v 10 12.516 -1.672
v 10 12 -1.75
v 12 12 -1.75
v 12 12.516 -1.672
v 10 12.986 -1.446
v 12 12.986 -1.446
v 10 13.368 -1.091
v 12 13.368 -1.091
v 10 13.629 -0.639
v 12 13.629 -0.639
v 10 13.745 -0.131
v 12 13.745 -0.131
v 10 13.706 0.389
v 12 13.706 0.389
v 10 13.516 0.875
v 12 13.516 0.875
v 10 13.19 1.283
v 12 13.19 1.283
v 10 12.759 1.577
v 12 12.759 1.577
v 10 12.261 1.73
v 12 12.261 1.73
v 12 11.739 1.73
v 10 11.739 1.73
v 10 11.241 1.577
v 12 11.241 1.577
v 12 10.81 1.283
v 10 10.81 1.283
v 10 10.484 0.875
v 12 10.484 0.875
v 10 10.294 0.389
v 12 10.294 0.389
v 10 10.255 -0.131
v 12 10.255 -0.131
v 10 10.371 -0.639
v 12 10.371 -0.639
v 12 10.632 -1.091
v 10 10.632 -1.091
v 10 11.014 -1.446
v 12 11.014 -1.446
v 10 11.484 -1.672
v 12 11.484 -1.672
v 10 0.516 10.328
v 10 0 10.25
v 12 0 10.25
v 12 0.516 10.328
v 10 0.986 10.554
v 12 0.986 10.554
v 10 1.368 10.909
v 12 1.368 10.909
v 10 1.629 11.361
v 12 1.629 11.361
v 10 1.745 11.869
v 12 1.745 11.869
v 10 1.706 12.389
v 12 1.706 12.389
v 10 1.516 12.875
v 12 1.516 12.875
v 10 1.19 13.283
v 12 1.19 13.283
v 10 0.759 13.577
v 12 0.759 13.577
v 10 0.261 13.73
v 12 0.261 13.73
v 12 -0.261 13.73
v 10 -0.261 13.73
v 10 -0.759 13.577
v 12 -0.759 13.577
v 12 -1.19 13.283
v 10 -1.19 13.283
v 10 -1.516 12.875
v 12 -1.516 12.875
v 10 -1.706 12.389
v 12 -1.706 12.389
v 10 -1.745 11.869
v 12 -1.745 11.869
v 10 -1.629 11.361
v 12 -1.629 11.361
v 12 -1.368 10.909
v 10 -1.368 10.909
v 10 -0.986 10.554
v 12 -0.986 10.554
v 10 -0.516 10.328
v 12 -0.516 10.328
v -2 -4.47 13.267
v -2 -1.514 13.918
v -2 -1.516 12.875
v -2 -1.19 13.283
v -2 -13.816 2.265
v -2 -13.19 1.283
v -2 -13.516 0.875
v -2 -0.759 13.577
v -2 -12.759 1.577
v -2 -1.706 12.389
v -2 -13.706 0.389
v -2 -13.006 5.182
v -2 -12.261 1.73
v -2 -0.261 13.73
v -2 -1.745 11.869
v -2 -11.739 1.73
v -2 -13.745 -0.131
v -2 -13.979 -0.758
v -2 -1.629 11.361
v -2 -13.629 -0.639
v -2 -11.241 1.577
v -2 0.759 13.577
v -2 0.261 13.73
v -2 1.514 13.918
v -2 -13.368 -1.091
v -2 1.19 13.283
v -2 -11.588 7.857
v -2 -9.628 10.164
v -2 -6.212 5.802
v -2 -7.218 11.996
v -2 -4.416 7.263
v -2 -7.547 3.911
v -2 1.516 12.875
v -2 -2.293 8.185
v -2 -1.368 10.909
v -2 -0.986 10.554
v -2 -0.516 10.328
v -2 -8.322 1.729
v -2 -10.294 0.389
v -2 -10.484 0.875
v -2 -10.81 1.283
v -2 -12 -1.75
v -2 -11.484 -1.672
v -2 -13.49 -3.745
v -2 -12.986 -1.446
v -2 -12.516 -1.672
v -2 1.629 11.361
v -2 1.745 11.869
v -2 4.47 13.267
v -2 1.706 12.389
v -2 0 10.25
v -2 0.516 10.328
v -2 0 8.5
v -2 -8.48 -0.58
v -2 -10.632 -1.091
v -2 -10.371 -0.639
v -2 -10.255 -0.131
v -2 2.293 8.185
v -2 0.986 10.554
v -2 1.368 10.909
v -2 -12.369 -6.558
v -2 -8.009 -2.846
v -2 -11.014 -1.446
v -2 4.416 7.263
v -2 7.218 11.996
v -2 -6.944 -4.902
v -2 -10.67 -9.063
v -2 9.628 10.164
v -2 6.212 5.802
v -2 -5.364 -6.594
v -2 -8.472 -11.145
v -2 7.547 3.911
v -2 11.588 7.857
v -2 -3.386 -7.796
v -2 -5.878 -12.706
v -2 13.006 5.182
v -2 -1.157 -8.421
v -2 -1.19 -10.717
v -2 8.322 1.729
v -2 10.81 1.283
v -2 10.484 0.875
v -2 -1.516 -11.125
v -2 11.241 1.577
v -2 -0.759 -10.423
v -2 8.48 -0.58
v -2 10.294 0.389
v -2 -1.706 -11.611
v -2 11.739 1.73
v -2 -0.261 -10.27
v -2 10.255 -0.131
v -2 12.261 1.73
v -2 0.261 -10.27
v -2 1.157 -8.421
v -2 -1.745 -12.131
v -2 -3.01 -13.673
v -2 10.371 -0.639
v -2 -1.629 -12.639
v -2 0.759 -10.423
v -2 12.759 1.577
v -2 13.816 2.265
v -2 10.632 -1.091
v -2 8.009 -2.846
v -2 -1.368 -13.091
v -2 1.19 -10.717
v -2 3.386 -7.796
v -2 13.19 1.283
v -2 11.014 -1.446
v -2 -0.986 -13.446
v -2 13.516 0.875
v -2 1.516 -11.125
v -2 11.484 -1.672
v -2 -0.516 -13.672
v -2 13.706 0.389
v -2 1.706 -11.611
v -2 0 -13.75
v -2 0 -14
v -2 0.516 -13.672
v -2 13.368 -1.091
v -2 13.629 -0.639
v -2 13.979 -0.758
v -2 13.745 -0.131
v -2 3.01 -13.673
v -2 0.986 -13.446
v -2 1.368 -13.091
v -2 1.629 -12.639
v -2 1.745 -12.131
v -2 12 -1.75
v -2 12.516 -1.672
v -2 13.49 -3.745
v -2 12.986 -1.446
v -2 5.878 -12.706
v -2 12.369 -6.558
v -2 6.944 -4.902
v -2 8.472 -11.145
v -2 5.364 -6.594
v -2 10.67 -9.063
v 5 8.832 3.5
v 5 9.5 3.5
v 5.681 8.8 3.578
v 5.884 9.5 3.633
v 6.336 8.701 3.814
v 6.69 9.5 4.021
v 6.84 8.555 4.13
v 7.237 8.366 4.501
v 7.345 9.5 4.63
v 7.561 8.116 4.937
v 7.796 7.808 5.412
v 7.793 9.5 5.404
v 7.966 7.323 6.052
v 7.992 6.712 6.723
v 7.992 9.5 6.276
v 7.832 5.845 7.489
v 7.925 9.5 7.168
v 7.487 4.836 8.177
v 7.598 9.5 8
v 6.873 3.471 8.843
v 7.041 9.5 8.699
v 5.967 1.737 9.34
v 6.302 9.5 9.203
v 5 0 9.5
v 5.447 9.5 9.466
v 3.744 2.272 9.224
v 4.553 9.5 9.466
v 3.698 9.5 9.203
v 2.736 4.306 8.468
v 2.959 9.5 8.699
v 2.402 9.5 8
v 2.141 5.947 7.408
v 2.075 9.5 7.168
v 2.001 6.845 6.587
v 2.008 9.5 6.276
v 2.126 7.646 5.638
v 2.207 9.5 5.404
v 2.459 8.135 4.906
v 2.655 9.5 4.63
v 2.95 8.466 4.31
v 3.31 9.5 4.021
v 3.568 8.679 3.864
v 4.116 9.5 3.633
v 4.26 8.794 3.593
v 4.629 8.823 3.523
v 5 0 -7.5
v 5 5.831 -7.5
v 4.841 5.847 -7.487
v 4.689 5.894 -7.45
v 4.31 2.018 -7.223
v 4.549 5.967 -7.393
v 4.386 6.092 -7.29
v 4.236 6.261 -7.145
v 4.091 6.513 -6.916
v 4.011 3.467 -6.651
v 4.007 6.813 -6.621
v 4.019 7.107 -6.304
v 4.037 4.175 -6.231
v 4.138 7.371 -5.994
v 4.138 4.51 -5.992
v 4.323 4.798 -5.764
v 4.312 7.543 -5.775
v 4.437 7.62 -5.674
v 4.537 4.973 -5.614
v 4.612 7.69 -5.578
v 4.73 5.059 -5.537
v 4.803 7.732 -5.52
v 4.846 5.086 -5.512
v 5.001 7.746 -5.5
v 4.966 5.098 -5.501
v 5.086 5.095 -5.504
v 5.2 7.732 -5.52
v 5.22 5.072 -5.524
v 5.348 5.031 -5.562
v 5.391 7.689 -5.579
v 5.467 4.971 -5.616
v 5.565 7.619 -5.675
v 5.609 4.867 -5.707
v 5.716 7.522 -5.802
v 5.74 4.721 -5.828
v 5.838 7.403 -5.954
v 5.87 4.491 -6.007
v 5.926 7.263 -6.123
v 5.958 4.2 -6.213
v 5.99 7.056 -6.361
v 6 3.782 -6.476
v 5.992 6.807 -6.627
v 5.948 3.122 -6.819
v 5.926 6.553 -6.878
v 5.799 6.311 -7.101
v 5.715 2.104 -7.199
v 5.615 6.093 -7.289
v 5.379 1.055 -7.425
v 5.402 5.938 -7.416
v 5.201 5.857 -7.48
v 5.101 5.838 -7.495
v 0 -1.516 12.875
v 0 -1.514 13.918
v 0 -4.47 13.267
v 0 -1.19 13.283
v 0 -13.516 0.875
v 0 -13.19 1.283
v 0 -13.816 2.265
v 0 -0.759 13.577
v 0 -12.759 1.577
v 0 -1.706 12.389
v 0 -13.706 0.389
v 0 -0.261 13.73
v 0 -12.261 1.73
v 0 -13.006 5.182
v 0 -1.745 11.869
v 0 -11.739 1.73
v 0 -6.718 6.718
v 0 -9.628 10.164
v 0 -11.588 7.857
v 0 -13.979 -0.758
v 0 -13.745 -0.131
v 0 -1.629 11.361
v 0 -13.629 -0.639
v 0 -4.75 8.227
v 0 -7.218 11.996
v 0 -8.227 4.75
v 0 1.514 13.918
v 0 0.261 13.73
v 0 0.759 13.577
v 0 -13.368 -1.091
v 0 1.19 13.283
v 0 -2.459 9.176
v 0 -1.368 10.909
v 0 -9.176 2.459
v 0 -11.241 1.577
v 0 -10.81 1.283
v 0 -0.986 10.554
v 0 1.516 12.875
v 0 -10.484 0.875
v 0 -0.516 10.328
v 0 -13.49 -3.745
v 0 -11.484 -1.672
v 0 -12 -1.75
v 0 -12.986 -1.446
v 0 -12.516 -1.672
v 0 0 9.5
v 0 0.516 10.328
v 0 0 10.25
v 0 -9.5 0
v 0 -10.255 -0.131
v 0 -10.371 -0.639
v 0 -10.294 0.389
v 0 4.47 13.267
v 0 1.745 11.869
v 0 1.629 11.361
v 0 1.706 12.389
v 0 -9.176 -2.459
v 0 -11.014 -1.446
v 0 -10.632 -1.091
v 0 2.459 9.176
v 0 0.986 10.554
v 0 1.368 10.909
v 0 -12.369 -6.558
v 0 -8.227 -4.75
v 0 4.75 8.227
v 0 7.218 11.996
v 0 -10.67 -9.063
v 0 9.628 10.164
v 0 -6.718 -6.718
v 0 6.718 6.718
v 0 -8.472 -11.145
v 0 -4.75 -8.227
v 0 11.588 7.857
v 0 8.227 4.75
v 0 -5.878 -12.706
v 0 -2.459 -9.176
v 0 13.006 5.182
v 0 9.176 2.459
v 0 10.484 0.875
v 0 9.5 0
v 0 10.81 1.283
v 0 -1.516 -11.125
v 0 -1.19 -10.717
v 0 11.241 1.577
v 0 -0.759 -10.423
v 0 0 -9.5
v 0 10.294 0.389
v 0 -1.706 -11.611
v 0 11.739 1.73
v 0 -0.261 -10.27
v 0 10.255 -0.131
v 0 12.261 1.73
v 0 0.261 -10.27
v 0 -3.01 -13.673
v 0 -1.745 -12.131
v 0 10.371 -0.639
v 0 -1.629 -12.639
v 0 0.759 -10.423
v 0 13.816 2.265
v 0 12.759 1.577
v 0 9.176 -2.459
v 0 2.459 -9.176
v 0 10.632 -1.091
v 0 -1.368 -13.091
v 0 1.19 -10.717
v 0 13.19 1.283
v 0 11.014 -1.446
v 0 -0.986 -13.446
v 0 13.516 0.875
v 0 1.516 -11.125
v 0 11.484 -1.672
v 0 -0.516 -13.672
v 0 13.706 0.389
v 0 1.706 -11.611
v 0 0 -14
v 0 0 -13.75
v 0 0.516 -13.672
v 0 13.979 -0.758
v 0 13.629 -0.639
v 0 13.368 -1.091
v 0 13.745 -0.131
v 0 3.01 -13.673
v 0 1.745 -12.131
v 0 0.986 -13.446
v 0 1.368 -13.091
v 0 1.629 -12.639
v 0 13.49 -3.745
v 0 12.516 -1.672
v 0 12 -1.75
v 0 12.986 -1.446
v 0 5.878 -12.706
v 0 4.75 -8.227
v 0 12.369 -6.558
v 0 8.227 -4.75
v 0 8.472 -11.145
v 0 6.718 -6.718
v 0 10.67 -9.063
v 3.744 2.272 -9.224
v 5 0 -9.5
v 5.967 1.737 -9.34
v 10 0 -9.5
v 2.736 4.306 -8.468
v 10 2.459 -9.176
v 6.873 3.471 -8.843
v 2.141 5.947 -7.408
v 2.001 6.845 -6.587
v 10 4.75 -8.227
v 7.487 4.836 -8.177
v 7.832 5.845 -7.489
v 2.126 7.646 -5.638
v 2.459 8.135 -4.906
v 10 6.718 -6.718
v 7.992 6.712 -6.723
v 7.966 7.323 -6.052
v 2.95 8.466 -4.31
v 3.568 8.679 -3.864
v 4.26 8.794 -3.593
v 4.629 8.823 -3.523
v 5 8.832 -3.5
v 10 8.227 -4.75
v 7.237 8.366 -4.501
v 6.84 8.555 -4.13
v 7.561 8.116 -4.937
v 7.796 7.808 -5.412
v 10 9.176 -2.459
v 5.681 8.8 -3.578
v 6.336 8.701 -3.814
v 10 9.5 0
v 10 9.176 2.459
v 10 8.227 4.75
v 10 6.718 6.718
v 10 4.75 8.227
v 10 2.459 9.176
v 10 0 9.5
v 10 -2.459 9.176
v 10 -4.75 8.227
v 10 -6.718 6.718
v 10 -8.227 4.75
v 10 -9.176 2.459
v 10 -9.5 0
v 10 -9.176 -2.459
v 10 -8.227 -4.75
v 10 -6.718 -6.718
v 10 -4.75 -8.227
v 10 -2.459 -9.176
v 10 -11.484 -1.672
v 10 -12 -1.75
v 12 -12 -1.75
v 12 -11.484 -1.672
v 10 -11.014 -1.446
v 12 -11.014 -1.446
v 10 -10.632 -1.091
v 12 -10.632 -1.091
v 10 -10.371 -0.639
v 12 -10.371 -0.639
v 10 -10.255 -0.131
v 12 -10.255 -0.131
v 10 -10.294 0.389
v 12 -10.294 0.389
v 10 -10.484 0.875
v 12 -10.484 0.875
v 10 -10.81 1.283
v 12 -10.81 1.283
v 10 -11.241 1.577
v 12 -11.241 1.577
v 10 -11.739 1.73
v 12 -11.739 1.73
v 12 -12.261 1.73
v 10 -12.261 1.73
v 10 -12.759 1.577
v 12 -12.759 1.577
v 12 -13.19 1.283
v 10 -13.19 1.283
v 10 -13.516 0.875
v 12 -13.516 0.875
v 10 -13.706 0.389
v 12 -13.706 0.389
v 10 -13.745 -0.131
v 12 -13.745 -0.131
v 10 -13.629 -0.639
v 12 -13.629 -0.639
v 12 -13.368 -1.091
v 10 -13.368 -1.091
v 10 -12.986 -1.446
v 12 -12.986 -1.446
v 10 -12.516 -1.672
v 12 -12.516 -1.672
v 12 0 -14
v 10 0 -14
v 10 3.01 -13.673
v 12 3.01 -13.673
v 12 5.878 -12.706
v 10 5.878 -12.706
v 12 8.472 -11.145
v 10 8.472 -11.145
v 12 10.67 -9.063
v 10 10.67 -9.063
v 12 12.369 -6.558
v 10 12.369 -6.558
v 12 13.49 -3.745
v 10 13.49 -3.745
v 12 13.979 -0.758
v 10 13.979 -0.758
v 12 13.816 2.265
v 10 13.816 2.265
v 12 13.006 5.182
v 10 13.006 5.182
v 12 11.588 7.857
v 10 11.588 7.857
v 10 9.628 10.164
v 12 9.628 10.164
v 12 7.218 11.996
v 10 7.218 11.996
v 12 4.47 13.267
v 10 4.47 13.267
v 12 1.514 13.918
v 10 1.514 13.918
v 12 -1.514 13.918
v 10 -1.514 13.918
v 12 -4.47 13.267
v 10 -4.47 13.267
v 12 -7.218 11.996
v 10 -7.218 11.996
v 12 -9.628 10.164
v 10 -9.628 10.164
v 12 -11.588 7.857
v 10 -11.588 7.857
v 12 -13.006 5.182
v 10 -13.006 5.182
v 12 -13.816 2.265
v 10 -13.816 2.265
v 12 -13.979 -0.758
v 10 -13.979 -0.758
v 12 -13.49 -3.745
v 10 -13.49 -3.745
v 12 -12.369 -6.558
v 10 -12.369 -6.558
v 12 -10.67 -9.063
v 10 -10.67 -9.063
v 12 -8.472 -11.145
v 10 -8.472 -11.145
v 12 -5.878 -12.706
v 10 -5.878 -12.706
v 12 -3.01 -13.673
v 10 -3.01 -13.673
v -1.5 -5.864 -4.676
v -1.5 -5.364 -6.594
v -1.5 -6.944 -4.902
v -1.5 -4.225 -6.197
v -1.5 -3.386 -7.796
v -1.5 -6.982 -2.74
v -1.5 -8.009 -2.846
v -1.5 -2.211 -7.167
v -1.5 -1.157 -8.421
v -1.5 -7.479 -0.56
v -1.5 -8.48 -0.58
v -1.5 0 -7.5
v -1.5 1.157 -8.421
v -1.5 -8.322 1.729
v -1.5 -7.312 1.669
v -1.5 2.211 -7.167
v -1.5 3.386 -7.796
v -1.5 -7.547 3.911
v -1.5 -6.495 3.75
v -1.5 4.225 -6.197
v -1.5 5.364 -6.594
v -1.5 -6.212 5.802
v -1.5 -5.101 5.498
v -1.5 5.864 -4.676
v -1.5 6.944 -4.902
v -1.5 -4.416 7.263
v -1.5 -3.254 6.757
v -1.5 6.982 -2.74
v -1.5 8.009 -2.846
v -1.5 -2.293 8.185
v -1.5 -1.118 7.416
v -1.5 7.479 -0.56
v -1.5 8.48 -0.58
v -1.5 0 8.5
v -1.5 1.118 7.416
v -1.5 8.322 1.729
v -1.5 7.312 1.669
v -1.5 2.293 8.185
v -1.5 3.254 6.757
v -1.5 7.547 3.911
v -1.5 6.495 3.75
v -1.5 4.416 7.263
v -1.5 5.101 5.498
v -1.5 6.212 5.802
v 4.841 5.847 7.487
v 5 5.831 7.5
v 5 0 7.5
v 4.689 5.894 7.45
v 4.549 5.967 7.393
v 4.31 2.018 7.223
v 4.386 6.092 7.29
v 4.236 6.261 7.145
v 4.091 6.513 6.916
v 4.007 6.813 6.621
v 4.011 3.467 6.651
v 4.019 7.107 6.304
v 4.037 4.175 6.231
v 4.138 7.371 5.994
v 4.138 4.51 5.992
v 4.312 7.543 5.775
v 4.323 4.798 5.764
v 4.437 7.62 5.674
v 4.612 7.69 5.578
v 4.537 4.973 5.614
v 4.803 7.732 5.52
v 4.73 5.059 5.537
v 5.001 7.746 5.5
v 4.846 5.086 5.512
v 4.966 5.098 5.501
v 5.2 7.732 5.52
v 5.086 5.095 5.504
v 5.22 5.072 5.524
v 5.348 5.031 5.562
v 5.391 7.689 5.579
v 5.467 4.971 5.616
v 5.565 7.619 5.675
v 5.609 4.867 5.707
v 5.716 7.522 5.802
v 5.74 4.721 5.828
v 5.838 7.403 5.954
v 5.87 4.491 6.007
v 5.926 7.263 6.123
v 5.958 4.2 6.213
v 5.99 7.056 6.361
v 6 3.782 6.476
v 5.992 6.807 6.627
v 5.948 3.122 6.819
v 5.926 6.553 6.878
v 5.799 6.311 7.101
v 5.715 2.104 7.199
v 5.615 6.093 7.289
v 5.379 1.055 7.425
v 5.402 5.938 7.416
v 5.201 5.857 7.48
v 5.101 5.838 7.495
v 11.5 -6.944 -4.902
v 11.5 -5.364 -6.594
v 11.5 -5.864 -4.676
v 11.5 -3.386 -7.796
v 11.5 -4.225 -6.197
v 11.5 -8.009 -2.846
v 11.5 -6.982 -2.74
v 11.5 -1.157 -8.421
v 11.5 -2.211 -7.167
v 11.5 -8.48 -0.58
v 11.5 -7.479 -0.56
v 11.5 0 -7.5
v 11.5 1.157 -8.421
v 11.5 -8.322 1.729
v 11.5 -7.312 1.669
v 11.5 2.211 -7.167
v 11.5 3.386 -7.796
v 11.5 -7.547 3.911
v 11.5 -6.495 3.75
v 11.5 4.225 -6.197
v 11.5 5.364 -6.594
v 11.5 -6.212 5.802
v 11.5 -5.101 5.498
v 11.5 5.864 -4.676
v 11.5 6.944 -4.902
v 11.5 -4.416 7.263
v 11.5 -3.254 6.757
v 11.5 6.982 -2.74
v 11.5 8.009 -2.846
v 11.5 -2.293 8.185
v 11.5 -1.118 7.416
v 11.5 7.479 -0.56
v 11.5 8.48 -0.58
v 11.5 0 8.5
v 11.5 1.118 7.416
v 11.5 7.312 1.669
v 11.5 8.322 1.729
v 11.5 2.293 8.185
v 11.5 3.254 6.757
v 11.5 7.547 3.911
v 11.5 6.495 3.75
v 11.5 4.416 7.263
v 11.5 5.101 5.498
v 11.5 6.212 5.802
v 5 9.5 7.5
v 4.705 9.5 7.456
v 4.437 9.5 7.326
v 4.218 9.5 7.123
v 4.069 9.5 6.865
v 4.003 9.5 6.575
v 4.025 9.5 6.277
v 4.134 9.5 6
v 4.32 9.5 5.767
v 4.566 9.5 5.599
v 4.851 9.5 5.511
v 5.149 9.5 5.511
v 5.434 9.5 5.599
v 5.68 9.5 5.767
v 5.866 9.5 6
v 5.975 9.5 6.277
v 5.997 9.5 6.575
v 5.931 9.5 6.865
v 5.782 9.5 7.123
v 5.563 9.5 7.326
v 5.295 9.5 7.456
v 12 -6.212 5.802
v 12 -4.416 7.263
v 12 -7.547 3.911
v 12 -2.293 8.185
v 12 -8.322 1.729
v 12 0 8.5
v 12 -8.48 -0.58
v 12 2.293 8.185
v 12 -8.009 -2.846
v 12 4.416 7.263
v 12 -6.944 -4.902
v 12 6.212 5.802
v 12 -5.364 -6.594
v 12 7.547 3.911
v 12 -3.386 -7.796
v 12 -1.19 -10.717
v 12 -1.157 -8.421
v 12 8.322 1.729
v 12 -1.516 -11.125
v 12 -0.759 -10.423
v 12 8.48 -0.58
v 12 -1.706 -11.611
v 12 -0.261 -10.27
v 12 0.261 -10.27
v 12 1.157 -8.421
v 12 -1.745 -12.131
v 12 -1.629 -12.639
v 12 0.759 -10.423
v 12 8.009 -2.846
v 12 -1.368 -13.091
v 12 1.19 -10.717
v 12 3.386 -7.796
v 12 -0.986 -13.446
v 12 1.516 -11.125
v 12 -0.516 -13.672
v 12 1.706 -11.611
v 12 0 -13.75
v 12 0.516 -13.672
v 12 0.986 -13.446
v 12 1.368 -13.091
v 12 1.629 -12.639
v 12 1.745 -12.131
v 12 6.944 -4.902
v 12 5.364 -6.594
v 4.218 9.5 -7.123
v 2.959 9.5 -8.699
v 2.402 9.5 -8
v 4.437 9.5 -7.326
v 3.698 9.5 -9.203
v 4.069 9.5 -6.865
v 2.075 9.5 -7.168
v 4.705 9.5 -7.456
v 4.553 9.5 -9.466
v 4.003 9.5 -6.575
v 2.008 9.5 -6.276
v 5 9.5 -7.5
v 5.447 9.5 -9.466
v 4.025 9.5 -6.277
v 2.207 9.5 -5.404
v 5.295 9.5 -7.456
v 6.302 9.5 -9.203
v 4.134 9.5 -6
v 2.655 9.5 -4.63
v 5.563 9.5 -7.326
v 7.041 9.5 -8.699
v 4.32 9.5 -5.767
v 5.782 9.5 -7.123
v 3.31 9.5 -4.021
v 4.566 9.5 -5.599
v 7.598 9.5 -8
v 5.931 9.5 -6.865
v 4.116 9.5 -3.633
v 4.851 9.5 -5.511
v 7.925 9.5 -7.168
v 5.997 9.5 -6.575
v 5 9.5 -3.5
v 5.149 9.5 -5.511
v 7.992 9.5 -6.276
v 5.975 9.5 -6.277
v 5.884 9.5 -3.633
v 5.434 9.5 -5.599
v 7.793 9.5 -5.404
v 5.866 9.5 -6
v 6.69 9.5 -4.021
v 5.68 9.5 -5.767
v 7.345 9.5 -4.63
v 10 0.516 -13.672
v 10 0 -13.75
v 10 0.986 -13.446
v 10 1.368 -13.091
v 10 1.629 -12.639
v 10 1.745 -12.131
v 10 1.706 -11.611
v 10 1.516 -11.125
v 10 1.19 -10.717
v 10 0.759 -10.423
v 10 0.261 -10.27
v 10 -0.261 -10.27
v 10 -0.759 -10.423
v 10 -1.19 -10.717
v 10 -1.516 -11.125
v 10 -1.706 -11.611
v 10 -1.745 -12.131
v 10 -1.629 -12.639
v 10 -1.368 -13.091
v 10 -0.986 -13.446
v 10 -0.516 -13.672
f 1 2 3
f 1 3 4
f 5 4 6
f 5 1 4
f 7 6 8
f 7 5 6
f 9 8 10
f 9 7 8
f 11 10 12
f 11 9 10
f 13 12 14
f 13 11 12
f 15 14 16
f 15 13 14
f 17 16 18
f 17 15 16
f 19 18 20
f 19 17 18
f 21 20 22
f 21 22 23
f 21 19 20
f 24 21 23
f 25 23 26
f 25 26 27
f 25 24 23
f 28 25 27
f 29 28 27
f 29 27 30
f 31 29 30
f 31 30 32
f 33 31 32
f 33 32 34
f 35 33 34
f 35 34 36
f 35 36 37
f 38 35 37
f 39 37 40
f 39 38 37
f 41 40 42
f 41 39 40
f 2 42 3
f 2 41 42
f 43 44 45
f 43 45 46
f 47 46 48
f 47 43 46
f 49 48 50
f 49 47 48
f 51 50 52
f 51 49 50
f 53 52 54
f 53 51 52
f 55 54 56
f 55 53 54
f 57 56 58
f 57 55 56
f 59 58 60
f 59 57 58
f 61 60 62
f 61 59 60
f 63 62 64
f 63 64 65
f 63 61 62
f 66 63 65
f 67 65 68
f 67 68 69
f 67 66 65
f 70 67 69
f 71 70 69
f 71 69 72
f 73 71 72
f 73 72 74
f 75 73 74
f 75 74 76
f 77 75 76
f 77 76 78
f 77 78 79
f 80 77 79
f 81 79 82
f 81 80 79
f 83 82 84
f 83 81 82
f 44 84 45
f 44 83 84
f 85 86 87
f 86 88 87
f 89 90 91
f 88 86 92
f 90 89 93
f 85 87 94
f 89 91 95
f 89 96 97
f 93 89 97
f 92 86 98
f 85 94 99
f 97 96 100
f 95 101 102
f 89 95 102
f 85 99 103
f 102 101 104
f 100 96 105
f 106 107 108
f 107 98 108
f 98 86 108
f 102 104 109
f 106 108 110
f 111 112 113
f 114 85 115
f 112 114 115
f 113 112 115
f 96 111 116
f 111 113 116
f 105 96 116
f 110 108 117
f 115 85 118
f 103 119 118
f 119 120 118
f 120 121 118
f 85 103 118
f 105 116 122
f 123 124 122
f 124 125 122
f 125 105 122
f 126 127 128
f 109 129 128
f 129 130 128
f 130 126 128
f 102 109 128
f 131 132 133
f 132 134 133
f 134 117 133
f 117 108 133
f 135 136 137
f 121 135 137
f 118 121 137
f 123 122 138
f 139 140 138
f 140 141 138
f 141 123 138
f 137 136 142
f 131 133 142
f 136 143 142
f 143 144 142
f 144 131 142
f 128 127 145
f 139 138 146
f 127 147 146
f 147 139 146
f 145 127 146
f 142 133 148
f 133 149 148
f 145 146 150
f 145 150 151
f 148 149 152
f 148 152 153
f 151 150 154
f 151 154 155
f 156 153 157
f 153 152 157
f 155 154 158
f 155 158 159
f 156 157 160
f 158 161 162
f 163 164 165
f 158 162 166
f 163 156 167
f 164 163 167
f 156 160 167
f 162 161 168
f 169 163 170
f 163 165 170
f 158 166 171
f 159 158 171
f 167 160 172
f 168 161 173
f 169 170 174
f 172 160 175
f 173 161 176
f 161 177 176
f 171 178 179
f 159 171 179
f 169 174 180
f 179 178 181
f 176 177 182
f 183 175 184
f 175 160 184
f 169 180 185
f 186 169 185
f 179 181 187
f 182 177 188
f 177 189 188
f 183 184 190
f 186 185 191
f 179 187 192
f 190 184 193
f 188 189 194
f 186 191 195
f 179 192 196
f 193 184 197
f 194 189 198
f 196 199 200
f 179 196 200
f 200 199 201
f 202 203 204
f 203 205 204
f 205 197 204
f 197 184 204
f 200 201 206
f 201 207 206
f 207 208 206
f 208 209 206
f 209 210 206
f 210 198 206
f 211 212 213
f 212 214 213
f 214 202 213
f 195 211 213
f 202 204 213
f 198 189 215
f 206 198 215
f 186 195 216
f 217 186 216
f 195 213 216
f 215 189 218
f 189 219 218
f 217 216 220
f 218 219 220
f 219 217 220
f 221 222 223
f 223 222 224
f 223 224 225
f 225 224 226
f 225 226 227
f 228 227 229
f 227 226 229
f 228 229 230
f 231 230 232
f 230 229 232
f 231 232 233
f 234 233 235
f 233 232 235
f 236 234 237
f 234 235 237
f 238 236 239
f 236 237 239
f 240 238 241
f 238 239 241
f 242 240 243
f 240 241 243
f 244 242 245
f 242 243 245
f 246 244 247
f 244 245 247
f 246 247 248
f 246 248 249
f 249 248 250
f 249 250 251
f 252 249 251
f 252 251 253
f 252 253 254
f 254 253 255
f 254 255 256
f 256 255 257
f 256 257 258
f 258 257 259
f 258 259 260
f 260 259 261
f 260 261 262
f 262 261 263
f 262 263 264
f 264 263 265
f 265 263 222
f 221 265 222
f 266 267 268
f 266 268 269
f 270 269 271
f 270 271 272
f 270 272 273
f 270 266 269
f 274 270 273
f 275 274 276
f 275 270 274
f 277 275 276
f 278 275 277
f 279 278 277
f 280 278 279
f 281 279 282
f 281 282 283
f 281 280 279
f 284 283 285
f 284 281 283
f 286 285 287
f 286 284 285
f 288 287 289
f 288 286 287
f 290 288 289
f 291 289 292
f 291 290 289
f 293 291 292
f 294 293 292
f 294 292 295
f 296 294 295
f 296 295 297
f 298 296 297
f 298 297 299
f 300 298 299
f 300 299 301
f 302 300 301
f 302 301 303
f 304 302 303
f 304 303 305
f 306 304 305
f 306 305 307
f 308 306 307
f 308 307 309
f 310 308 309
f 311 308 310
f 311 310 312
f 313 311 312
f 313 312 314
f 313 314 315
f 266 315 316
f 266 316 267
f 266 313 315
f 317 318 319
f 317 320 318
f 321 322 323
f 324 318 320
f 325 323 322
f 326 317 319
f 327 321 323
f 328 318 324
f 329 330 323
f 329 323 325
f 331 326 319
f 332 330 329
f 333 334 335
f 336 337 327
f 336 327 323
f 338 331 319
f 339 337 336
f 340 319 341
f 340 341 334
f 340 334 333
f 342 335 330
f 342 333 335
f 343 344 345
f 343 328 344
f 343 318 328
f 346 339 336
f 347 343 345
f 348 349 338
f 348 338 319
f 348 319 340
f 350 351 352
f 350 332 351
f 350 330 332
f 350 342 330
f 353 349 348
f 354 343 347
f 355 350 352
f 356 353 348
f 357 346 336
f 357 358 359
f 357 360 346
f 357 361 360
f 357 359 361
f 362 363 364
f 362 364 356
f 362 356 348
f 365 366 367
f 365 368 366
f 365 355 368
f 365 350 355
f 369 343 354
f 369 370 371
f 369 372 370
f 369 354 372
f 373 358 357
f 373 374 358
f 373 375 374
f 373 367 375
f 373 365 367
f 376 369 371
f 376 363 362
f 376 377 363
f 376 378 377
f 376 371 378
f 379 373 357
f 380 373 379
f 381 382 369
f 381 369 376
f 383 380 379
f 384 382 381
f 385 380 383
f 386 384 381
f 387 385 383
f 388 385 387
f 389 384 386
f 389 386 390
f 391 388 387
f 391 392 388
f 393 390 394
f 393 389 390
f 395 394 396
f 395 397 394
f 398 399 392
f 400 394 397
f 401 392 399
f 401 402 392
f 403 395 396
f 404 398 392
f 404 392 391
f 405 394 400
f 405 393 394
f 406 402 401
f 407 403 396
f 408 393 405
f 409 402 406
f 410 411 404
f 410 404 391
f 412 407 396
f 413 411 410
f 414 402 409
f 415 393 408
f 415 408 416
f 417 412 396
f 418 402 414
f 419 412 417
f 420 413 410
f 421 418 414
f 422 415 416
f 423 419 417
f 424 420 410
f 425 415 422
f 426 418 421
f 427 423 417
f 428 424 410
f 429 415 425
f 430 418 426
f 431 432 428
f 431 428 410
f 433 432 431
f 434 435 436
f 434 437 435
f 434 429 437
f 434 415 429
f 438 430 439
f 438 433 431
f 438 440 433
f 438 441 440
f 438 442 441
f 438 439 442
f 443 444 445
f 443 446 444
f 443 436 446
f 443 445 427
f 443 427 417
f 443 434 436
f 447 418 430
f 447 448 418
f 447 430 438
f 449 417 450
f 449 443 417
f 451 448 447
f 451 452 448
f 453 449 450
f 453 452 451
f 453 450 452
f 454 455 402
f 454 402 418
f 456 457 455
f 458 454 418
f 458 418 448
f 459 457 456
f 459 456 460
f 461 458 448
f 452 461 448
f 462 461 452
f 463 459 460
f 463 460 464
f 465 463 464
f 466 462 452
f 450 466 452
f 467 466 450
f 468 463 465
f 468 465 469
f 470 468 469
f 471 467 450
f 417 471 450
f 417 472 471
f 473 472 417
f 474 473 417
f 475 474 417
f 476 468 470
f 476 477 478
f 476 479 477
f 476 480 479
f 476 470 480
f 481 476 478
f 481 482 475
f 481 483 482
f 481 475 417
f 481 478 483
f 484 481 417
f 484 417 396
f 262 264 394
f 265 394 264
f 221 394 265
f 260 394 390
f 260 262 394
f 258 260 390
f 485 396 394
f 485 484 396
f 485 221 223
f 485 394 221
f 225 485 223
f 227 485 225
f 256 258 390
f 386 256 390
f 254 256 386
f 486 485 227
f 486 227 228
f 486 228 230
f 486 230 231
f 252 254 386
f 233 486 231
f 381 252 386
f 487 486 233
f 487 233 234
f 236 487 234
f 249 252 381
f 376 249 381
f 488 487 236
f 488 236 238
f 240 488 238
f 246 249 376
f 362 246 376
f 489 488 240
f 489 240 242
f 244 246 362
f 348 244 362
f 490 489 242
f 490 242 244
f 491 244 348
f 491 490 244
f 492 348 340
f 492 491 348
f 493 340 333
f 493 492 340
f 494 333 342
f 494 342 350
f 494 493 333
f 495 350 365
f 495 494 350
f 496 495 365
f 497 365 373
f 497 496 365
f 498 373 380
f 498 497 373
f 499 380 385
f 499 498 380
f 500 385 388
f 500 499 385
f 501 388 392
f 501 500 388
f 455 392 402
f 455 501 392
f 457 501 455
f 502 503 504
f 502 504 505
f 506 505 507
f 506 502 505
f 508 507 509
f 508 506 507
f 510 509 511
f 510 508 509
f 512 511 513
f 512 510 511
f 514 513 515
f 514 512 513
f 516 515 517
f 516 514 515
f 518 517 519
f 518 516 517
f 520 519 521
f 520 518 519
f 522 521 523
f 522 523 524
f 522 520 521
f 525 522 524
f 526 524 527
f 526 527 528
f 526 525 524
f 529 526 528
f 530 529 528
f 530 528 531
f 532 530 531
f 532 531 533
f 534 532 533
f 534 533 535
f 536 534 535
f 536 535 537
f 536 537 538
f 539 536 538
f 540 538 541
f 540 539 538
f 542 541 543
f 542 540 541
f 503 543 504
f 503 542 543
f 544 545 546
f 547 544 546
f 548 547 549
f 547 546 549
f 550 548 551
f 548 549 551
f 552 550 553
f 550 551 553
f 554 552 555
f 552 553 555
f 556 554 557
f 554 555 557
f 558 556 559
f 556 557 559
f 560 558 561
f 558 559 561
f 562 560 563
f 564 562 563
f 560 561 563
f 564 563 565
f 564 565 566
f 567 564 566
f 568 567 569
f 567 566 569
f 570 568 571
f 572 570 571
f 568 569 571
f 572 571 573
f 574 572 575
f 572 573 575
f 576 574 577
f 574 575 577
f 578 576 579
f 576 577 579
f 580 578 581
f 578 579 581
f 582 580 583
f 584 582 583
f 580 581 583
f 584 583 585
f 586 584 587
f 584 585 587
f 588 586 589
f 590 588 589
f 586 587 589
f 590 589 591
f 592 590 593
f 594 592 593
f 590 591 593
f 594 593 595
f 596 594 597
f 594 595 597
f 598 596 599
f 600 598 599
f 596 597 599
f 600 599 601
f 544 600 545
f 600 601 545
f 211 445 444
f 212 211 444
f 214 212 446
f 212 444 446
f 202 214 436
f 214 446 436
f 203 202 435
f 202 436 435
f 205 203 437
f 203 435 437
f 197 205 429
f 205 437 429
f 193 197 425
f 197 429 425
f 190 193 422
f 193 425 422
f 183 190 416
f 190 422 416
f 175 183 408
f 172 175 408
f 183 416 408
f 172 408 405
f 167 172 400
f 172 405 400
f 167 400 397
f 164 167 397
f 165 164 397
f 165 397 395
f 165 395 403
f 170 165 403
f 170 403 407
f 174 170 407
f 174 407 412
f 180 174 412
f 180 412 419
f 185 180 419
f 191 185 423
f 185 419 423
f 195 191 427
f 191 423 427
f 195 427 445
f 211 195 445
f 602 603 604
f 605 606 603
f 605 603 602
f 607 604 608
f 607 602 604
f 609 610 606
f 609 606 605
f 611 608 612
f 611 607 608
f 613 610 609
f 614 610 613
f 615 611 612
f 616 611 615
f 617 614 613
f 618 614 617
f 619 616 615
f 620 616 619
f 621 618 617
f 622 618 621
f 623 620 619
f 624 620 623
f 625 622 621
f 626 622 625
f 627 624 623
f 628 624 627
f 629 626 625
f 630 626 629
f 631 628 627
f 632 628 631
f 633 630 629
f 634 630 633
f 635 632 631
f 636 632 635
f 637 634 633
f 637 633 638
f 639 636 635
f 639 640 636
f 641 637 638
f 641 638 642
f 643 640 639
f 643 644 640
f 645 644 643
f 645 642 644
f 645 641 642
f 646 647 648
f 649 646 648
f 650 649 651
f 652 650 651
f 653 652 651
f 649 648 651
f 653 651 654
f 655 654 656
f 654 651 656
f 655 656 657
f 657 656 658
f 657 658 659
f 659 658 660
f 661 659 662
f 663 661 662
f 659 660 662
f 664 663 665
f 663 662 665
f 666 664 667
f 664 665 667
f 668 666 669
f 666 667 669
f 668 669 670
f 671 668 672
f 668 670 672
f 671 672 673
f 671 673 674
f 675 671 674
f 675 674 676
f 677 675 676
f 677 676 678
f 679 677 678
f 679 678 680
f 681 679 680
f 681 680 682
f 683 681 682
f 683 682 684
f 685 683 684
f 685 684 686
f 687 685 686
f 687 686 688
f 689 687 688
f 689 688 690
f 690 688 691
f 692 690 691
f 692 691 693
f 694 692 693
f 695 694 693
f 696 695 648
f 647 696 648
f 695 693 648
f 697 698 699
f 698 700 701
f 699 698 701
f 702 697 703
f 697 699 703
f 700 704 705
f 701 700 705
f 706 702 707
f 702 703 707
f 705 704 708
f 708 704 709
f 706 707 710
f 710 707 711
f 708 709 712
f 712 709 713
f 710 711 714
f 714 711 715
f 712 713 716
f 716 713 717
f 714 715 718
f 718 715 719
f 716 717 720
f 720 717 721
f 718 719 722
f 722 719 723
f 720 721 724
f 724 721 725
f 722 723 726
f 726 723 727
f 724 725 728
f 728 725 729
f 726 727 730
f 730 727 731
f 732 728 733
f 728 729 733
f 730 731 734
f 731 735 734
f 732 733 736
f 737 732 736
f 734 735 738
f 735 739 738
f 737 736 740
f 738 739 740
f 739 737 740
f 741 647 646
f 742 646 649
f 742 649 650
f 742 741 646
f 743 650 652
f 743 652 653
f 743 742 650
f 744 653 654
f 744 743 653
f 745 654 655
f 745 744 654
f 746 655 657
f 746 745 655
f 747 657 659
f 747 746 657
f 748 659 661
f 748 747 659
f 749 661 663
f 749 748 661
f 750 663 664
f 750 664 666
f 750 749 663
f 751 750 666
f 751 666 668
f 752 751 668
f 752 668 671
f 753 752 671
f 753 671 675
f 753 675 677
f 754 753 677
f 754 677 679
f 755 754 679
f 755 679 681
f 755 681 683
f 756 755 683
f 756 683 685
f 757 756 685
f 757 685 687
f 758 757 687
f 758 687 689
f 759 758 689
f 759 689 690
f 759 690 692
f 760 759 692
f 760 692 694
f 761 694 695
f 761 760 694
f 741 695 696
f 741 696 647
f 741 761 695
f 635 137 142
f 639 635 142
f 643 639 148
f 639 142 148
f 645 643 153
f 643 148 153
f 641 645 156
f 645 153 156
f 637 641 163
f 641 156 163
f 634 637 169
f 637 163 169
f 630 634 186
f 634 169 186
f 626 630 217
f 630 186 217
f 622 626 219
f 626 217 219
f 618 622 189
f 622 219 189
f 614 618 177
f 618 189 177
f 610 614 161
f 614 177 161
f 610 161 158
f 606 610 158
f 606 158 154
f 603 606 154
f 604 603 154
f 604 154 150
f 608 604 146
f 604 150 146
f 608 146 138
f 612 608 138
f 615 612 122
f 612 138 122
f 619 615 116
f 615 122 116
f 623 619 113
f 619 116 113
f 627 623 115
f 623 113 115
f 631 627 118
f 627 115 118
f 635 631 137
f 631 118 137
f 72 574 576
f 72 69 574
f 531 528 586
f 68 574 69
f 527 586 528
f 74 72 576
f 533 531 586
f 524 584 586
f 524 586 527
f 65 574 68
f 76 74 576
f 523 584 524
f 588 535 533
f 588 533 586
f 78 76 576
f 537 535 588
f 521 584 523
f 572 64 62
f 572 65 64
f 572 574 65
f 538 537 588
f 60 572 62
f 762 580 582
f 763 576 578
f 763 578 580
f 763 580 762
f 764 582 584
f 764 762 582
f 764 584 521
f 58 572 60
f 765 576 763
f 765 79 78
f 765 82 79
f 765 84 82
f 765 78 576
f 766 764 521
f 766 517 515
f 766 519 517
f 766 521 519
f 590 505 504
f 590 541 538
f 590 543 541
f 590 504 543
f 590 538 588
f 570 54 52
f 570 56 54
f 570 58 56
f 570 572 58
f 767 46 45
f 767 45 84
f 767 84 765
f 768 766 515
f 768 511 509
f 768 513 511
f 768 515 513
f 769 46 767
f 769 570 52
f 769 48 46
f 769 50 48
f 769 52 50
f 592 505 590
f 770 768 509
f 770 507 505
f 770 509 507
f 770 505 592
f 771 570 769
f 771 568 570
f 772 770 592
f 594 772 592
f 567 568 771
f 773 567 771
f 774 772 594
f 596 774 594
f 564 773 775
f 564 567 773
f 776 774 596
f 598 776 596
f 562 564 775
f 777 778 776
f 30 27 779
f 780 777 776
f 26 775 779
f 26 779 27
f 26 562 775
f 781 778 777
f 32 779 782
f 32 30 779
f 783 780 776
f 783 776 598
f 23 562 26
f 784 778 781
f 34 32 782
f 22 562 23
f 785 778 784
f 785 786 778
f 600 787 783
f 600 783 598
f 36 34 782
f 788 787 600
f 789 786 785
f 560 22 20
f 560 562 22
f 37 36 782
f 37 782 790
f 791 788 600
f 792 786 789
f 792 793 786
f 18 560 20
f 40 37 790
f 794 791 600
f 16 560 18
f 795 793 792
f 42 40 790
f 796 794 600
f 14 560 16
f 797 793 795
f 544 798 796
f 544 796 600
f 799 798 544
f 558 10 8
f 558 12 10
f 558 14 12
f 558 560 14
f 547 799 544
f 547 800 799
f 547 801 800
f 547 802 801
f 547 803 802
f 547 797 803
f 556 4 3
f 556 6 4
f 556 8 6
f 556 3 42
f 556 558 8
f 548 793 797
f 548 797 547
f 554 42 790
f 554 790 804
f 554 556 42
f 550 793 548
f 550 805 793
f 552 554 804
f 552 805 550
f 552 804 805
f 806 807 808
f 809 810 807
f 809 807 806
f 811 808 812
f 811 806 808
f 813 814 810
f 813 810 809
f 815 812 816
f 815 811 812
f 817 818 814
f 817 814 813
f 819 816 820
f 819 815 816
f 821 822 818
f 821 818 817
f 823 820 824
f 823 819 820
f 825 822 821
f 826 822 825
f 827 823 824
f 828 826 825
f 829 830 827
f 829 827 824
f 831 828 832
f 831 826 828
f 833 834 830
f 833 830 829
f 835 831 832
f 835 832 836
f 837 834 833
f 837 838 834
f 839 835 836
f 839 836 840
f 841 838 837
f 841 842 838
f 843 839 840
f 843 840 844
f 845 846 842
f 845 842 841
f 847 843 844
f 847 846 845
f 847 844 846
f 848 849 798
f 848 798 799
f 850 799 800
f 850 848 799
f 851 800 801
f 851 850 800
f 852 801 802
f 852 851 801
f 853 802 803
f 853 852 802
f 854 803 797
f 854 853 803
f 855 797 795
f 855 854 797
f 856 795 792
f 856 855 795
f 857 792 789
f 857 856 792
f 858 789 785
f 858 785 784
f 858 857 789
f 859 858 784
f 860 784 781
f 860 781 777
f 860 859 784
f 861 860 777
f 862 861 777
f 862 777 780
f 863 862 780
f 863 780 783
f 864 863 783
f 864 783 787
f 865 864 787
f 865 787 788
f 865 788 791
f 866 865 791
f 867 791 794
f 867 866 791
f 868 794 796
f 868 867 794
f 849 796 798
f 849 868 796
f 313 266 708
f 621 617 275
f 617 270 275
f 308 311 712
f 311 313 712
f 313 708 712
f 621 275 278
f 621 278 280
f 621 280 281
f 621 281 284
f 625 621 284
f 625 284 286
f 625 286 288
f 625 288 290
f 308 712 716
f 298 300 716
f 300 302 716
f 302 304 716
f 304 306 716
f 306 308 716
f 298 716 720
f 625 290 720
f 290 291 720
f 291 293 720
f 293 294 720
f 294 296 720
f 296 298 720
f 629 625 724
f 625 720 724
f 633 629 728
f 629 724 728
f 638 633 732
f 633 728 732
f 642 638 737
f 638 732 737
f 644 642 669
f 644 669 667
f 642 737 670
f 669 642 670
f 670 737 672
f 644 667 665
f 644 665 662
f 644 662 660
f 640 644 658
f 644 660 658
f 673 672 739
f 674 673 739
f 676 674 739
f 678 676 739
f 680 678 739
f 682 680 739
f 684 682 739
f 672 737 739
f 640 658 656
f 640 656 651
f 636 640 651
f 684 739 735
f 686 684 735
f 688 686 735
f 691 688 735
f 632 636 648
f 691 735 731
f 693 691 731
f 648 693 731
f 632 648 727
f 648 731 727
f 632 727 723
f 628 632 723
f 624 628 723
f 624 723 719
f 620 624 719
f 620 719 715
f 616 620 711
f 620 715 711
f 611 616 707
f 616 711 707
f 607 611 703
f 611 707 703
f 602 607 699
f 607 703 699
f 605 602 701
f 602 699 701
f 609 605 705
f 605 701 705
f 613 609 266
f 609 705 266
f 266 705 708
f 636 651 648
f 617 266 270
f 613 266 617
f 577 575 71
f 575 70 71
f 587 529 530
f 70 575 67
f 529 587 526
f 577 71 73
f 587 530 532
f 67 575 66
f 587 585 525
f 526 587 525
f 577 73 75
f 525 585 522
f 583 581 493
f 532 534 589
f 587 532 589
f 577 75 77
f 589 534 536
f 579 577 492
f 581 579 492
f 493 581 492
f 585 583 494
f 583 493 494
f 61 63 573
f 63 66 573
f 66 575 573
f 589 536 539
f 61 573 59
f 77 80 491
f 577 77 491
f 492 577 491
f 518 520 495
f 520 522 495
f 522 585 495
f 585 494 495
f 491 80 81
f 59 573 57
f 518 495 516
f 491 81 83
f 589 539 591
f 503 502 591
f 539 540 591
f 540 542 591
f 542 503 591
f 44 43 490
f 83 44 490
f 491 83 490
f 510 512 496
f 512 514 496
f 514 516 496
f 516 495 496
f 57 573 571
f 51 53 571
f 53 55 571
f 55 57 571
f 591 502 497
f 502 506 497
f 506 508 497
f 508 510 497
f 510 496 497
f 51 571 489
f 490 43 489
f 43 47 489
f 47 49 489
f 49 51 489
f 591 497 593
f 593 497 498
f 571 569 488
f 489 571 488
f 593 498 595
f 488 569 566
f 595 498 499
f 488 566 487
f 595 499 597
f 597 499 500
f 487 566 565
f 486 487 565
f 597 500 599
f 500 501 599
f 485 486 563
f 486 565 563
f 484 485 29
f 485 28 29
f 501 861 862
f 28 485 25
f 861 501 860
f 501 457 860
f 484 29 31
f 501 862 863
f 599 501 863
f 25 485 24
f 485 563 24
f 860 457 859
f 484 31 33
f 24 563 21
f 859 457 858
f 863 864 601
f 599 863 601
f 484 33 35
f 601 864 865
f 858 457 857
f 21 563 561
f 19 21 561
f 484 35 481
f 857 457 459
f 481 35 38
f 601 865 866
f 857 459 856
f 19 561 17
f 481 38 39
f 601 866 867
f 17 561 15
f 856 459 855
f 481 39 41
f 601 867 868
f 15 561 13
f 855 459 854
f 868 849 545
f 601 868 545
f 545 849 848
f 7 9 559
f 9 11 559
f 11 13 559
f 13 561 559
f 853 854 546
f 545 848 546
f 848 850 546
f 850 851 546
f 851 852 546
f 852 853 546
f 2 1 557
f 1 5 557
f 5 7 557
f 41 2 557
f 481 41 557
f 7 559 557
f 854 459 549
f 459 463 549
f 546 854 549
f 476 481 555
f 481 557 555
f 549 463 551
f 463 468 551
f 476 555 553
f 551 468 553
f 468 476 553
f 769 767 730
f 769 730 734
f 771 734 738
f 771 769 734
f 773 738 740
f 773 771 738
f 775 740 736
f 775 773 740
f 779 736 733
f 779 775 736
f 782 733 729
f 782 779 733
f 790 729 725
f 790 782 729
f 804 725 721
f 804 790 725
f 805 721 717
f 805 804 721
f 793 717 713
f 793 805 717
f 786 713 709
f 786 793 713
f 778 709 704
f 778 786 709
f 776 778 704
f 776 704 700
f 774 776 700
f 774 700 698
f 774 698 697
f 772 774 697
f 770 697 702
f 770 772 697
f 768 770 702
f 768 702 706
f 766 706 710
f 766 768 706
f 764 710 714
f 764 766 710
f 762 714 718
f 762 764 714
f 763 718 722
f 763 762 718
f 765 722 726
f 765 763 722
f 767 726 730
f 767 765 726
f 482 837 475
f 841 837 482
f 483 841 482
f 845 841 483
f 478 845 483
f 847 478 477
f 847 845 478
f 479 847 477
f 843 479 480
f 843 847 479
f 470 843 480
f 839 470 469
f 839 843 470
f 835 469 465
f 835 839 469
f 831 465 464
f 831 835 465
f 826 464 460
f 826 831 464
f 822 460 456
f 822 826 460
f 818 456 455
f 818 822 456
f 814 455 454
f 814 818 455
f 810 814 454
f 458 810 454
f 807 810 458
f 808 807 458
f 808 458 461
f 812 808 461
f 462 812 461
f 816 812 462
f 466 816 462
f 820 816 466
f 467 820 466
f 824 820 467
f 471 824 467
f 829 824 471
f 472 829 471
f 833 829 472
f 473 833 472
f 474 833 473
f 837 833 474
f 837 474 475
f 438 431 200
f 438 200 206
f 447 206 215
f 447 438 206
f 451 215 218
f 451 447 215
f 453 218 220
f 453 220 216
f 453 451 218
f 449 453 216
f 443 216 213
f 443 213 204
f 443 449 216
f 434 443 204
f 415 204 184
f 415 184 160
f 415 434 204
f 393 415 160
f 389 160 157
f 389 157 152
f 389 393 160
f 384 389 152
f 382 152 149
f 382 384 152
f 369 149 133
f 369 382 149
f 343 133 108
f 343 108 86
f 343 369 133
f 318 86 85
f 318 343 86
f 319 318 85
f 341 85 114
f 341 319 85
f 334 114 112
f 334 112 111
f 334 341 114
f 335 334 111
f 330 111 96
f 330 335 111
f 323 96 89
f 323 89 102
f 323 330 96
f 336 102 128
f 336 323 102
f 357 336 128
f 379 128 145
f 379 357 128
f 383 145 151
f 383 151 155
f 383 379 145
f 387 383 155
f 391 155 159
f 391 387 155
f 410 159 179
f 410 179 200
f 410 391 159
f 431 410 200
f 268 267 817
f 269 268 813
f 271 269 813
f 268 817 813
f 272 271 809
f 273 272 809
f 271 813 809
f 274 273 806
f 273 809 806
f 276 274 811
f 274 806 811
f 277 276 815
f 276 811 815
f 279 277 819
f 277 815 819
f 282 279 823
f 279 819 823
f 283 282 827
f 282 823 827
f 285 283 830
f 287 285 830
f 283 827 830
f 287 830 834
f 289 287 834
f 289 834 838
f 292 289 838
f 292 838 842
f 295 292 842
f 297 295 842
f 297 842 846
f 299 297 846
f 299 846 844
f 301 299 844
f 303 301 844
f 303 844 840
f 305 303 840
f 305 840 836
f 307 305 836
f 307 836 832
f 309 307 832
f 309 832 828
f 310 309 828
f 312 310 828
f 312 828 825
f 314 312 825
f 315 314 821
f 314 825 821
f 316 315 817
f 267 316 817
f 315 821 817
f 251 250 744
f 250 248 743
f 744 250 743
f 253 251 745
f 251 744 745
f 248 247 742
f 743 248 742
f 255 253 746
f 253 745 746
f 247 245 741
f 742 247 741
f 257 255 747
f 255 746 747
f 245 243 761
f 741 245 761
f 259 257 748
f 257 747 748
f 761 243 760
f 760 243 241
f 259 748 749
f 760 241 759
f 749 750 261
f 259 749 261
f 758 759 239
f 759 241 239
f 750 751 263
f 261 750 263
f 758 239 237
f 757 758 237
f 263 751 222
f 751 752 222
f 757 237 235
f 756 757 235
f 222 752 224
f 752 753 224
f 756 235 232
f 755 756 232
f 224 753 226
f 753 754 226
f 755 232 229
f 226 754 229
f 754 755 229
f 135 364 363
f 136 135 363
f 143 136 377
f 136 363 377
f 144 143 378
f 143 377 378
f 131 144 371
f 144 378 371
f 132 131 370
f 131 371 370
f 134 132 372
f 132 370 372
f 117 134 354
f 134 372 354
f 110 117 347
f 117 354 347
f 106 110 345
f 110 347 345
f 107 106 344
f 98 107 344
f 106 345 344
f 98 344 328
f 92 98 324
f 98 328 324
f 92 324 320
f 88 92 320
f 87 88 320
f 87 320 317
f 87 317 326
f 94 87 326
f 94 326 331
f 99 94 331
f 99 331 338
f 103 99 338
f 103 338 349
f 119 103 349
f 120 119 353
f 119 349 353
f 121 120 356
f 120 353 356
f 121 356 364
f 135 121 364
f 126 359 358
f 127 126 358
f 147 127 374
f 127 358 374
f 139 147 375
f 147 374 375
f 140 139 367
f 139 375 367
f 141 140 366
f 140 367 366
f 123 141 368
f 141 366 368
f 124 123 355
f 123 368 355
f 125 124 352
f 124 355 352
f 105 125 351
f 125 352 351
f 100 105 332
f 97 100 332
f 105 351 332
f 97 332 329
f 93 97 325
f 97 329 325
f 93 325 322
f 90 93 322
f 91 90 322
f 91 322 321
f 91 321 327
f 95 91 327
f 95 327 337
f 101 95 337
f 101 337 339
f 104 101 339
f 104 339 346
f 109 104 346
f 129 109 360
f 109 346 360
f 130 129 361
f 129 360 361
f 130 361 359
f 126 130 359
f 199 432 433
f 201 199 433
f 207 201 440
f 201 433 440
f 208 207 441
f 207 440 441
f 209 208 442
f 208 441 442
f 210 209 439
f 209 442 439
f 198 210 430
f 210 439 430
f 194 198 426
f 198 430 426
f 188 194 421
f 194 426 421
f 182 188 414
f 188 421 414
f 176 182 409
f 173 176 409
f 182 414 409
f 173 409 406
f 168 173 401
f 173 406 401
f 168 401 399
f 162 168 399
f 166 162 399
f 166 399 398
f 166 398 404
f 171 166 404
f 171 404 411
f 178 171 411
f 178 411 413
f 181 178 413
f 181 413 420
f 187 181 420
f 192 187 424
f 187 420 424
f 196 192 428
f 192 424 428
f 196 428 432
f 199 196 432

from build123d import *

# Parameters (mm, degrees)
SKETCH2_R                = 14
SKETCH2_R_2              = 1.75
SKETCH2_R_3              = 7.5
FLANGE_DEPTH             = 2
SKETCH3_R                = 8.5
O_RING_SEAT_DEPTH        = 0.5
BOSS_EXTRUDE1_START      = 10
SKETCH4_R                = 9.5
SKETCH4_R_2              = 7.5
BOSS_EXTRUDE1_DEPTH      = 10
SKETCH5_R                = 1
OUTLET_DEPTH             = 24.151673806
BOSS_EXTRUDE2_REACH      = 31.871
BOSS_EXTRUDE2_END_RADIUS = 9.5
SKETCH6_R                = 3
SKETCH6_R_2              = 1


with BuildPart() as part:
    # Sketch2 → Flange (new body)
    with BuildSketch(Plane(origin=(0, 0, 0), x_dir=(0, 0, -1), z_dir=(1, 0, 0))):
        Circle(SKETCH2_R)
        with Locations((0, 12)):
            Circle(SKETCH2_R_2, mode=Mode.SUBTRACT)
        with Locations((12, 0)):
            Circle(SKETCH2_R_2, mode=Mode.SUBTRACT)
        with Locations((0, -12)):
            Circle(SKETCH2_R_2, mode=Mode.SUBTRACT)
        with Locations((-12, 0)):
            Circle(SKETCH2_R_2, mode=Mode.SUBTRACT)
        Circle(SKETCH2_R_3, mode=Mode.SUBTRACT)
    flange = extrude(amount=-FLANGE_DEPTH)

    # Sketch3 → O-Ring Seat (cut)
    with BuildSketch(Plane.ZY.offset(2)):
        Circle(SKETCH3_R)
    o_ring_seat = extrude(amount=-O_RING_SEAT_DEPTH, mode=Mode.SUBTRACT)

    # Sketch4 → Boss-Extrude1 (add)
    with BuildSketch(Plane(origin=(0, 0, 0), x_dir=(0, 0, -1), z_dir=(1, 0, 0)).offset(BOSS_EXTRUDE1_START)):
        Circle(SKETCH4_R)
        Circle(SKETCH4_R_2, mode=Mode.SUBTRACT)
    extrude(amount=-BOSS_EXTRUDE1_DEPTH)

    # Mirror1: Flange, O-Ring Seat across plane
    add(flange.mirror(Plane(origin=(5, 0, 0), x_dir=(0, 0, 1), z_dir=(1, 0, 0))))
    add(o_ring_seat.mirror(Plane(origin=(5, 0, 0), x_dir=(0, 0, 1), z_dir=(1, 0, 0))), mode=Mode.SUBTRACT)

    # Sketch5 → Outlet (cut, through all)
    with BuildSketch(Plane(origin=(0, 0, 0), x_dir=(1, 0, 0), z_dir=(0, 1, 0))):
        with Locations(Location((5, 6.5, 0), (0, 0, 90))):
            Circle(SKETCH5_R)
    outlet = extrude(amount=OUTLET_DEPTH, mode=Mode.SUBTRACT)

    # Boss-Extrude2: up to this cylinder (the profile starts outside it)
    boss_extrude2_end = Plane(origin=(5, 0, 0), z_dir=(-1, 0, 0)) * Cylinder(BOSS_EXTRUDE2_END_RADIUS, 83.742, mode=Mode.PRIVATE)
    # Sketch6 → Boss-Extrude2 (add, up to the surface)
    with BuildSketch(Plane(origin=(0, 9.5, 0), x_dir=(1, 0, 0), z_dir=(0, 1, 0)), mode=Mode.PRIVATE) as boss_extrude2_sk1:
        with Locations(Location((5, 6.5, 0), (0, 0, 270))):
            Circle(SKETCH6_R)
        with Locations(Location((5, 6.5, 0), (0, 0, 90))):
            Circle(SKETCH6_R_2, mode=Mode.SUBTRACT)
    boss_extrude2_tool1 = extrude(boss_extrude2_sk1.sketch, amount=-BOSS_EXTRUDE2_REACH, mode=Mode.PRIVATE) - boss_extrude2_end
    boss_extrude2 = boss_extrude2_tool1.solids().sort_by_distance((5, 9.5, -9.415147))[0]
    add(boss_extrude2)

    # Inlet: Outlet, Boss-Extrude2 across plane
    add(outlet.mirror(Plane.XY), mode=Mode.SUBTRACT)
    add(boss_extrude2.mirror(Plane.XY))


solid = part.part
